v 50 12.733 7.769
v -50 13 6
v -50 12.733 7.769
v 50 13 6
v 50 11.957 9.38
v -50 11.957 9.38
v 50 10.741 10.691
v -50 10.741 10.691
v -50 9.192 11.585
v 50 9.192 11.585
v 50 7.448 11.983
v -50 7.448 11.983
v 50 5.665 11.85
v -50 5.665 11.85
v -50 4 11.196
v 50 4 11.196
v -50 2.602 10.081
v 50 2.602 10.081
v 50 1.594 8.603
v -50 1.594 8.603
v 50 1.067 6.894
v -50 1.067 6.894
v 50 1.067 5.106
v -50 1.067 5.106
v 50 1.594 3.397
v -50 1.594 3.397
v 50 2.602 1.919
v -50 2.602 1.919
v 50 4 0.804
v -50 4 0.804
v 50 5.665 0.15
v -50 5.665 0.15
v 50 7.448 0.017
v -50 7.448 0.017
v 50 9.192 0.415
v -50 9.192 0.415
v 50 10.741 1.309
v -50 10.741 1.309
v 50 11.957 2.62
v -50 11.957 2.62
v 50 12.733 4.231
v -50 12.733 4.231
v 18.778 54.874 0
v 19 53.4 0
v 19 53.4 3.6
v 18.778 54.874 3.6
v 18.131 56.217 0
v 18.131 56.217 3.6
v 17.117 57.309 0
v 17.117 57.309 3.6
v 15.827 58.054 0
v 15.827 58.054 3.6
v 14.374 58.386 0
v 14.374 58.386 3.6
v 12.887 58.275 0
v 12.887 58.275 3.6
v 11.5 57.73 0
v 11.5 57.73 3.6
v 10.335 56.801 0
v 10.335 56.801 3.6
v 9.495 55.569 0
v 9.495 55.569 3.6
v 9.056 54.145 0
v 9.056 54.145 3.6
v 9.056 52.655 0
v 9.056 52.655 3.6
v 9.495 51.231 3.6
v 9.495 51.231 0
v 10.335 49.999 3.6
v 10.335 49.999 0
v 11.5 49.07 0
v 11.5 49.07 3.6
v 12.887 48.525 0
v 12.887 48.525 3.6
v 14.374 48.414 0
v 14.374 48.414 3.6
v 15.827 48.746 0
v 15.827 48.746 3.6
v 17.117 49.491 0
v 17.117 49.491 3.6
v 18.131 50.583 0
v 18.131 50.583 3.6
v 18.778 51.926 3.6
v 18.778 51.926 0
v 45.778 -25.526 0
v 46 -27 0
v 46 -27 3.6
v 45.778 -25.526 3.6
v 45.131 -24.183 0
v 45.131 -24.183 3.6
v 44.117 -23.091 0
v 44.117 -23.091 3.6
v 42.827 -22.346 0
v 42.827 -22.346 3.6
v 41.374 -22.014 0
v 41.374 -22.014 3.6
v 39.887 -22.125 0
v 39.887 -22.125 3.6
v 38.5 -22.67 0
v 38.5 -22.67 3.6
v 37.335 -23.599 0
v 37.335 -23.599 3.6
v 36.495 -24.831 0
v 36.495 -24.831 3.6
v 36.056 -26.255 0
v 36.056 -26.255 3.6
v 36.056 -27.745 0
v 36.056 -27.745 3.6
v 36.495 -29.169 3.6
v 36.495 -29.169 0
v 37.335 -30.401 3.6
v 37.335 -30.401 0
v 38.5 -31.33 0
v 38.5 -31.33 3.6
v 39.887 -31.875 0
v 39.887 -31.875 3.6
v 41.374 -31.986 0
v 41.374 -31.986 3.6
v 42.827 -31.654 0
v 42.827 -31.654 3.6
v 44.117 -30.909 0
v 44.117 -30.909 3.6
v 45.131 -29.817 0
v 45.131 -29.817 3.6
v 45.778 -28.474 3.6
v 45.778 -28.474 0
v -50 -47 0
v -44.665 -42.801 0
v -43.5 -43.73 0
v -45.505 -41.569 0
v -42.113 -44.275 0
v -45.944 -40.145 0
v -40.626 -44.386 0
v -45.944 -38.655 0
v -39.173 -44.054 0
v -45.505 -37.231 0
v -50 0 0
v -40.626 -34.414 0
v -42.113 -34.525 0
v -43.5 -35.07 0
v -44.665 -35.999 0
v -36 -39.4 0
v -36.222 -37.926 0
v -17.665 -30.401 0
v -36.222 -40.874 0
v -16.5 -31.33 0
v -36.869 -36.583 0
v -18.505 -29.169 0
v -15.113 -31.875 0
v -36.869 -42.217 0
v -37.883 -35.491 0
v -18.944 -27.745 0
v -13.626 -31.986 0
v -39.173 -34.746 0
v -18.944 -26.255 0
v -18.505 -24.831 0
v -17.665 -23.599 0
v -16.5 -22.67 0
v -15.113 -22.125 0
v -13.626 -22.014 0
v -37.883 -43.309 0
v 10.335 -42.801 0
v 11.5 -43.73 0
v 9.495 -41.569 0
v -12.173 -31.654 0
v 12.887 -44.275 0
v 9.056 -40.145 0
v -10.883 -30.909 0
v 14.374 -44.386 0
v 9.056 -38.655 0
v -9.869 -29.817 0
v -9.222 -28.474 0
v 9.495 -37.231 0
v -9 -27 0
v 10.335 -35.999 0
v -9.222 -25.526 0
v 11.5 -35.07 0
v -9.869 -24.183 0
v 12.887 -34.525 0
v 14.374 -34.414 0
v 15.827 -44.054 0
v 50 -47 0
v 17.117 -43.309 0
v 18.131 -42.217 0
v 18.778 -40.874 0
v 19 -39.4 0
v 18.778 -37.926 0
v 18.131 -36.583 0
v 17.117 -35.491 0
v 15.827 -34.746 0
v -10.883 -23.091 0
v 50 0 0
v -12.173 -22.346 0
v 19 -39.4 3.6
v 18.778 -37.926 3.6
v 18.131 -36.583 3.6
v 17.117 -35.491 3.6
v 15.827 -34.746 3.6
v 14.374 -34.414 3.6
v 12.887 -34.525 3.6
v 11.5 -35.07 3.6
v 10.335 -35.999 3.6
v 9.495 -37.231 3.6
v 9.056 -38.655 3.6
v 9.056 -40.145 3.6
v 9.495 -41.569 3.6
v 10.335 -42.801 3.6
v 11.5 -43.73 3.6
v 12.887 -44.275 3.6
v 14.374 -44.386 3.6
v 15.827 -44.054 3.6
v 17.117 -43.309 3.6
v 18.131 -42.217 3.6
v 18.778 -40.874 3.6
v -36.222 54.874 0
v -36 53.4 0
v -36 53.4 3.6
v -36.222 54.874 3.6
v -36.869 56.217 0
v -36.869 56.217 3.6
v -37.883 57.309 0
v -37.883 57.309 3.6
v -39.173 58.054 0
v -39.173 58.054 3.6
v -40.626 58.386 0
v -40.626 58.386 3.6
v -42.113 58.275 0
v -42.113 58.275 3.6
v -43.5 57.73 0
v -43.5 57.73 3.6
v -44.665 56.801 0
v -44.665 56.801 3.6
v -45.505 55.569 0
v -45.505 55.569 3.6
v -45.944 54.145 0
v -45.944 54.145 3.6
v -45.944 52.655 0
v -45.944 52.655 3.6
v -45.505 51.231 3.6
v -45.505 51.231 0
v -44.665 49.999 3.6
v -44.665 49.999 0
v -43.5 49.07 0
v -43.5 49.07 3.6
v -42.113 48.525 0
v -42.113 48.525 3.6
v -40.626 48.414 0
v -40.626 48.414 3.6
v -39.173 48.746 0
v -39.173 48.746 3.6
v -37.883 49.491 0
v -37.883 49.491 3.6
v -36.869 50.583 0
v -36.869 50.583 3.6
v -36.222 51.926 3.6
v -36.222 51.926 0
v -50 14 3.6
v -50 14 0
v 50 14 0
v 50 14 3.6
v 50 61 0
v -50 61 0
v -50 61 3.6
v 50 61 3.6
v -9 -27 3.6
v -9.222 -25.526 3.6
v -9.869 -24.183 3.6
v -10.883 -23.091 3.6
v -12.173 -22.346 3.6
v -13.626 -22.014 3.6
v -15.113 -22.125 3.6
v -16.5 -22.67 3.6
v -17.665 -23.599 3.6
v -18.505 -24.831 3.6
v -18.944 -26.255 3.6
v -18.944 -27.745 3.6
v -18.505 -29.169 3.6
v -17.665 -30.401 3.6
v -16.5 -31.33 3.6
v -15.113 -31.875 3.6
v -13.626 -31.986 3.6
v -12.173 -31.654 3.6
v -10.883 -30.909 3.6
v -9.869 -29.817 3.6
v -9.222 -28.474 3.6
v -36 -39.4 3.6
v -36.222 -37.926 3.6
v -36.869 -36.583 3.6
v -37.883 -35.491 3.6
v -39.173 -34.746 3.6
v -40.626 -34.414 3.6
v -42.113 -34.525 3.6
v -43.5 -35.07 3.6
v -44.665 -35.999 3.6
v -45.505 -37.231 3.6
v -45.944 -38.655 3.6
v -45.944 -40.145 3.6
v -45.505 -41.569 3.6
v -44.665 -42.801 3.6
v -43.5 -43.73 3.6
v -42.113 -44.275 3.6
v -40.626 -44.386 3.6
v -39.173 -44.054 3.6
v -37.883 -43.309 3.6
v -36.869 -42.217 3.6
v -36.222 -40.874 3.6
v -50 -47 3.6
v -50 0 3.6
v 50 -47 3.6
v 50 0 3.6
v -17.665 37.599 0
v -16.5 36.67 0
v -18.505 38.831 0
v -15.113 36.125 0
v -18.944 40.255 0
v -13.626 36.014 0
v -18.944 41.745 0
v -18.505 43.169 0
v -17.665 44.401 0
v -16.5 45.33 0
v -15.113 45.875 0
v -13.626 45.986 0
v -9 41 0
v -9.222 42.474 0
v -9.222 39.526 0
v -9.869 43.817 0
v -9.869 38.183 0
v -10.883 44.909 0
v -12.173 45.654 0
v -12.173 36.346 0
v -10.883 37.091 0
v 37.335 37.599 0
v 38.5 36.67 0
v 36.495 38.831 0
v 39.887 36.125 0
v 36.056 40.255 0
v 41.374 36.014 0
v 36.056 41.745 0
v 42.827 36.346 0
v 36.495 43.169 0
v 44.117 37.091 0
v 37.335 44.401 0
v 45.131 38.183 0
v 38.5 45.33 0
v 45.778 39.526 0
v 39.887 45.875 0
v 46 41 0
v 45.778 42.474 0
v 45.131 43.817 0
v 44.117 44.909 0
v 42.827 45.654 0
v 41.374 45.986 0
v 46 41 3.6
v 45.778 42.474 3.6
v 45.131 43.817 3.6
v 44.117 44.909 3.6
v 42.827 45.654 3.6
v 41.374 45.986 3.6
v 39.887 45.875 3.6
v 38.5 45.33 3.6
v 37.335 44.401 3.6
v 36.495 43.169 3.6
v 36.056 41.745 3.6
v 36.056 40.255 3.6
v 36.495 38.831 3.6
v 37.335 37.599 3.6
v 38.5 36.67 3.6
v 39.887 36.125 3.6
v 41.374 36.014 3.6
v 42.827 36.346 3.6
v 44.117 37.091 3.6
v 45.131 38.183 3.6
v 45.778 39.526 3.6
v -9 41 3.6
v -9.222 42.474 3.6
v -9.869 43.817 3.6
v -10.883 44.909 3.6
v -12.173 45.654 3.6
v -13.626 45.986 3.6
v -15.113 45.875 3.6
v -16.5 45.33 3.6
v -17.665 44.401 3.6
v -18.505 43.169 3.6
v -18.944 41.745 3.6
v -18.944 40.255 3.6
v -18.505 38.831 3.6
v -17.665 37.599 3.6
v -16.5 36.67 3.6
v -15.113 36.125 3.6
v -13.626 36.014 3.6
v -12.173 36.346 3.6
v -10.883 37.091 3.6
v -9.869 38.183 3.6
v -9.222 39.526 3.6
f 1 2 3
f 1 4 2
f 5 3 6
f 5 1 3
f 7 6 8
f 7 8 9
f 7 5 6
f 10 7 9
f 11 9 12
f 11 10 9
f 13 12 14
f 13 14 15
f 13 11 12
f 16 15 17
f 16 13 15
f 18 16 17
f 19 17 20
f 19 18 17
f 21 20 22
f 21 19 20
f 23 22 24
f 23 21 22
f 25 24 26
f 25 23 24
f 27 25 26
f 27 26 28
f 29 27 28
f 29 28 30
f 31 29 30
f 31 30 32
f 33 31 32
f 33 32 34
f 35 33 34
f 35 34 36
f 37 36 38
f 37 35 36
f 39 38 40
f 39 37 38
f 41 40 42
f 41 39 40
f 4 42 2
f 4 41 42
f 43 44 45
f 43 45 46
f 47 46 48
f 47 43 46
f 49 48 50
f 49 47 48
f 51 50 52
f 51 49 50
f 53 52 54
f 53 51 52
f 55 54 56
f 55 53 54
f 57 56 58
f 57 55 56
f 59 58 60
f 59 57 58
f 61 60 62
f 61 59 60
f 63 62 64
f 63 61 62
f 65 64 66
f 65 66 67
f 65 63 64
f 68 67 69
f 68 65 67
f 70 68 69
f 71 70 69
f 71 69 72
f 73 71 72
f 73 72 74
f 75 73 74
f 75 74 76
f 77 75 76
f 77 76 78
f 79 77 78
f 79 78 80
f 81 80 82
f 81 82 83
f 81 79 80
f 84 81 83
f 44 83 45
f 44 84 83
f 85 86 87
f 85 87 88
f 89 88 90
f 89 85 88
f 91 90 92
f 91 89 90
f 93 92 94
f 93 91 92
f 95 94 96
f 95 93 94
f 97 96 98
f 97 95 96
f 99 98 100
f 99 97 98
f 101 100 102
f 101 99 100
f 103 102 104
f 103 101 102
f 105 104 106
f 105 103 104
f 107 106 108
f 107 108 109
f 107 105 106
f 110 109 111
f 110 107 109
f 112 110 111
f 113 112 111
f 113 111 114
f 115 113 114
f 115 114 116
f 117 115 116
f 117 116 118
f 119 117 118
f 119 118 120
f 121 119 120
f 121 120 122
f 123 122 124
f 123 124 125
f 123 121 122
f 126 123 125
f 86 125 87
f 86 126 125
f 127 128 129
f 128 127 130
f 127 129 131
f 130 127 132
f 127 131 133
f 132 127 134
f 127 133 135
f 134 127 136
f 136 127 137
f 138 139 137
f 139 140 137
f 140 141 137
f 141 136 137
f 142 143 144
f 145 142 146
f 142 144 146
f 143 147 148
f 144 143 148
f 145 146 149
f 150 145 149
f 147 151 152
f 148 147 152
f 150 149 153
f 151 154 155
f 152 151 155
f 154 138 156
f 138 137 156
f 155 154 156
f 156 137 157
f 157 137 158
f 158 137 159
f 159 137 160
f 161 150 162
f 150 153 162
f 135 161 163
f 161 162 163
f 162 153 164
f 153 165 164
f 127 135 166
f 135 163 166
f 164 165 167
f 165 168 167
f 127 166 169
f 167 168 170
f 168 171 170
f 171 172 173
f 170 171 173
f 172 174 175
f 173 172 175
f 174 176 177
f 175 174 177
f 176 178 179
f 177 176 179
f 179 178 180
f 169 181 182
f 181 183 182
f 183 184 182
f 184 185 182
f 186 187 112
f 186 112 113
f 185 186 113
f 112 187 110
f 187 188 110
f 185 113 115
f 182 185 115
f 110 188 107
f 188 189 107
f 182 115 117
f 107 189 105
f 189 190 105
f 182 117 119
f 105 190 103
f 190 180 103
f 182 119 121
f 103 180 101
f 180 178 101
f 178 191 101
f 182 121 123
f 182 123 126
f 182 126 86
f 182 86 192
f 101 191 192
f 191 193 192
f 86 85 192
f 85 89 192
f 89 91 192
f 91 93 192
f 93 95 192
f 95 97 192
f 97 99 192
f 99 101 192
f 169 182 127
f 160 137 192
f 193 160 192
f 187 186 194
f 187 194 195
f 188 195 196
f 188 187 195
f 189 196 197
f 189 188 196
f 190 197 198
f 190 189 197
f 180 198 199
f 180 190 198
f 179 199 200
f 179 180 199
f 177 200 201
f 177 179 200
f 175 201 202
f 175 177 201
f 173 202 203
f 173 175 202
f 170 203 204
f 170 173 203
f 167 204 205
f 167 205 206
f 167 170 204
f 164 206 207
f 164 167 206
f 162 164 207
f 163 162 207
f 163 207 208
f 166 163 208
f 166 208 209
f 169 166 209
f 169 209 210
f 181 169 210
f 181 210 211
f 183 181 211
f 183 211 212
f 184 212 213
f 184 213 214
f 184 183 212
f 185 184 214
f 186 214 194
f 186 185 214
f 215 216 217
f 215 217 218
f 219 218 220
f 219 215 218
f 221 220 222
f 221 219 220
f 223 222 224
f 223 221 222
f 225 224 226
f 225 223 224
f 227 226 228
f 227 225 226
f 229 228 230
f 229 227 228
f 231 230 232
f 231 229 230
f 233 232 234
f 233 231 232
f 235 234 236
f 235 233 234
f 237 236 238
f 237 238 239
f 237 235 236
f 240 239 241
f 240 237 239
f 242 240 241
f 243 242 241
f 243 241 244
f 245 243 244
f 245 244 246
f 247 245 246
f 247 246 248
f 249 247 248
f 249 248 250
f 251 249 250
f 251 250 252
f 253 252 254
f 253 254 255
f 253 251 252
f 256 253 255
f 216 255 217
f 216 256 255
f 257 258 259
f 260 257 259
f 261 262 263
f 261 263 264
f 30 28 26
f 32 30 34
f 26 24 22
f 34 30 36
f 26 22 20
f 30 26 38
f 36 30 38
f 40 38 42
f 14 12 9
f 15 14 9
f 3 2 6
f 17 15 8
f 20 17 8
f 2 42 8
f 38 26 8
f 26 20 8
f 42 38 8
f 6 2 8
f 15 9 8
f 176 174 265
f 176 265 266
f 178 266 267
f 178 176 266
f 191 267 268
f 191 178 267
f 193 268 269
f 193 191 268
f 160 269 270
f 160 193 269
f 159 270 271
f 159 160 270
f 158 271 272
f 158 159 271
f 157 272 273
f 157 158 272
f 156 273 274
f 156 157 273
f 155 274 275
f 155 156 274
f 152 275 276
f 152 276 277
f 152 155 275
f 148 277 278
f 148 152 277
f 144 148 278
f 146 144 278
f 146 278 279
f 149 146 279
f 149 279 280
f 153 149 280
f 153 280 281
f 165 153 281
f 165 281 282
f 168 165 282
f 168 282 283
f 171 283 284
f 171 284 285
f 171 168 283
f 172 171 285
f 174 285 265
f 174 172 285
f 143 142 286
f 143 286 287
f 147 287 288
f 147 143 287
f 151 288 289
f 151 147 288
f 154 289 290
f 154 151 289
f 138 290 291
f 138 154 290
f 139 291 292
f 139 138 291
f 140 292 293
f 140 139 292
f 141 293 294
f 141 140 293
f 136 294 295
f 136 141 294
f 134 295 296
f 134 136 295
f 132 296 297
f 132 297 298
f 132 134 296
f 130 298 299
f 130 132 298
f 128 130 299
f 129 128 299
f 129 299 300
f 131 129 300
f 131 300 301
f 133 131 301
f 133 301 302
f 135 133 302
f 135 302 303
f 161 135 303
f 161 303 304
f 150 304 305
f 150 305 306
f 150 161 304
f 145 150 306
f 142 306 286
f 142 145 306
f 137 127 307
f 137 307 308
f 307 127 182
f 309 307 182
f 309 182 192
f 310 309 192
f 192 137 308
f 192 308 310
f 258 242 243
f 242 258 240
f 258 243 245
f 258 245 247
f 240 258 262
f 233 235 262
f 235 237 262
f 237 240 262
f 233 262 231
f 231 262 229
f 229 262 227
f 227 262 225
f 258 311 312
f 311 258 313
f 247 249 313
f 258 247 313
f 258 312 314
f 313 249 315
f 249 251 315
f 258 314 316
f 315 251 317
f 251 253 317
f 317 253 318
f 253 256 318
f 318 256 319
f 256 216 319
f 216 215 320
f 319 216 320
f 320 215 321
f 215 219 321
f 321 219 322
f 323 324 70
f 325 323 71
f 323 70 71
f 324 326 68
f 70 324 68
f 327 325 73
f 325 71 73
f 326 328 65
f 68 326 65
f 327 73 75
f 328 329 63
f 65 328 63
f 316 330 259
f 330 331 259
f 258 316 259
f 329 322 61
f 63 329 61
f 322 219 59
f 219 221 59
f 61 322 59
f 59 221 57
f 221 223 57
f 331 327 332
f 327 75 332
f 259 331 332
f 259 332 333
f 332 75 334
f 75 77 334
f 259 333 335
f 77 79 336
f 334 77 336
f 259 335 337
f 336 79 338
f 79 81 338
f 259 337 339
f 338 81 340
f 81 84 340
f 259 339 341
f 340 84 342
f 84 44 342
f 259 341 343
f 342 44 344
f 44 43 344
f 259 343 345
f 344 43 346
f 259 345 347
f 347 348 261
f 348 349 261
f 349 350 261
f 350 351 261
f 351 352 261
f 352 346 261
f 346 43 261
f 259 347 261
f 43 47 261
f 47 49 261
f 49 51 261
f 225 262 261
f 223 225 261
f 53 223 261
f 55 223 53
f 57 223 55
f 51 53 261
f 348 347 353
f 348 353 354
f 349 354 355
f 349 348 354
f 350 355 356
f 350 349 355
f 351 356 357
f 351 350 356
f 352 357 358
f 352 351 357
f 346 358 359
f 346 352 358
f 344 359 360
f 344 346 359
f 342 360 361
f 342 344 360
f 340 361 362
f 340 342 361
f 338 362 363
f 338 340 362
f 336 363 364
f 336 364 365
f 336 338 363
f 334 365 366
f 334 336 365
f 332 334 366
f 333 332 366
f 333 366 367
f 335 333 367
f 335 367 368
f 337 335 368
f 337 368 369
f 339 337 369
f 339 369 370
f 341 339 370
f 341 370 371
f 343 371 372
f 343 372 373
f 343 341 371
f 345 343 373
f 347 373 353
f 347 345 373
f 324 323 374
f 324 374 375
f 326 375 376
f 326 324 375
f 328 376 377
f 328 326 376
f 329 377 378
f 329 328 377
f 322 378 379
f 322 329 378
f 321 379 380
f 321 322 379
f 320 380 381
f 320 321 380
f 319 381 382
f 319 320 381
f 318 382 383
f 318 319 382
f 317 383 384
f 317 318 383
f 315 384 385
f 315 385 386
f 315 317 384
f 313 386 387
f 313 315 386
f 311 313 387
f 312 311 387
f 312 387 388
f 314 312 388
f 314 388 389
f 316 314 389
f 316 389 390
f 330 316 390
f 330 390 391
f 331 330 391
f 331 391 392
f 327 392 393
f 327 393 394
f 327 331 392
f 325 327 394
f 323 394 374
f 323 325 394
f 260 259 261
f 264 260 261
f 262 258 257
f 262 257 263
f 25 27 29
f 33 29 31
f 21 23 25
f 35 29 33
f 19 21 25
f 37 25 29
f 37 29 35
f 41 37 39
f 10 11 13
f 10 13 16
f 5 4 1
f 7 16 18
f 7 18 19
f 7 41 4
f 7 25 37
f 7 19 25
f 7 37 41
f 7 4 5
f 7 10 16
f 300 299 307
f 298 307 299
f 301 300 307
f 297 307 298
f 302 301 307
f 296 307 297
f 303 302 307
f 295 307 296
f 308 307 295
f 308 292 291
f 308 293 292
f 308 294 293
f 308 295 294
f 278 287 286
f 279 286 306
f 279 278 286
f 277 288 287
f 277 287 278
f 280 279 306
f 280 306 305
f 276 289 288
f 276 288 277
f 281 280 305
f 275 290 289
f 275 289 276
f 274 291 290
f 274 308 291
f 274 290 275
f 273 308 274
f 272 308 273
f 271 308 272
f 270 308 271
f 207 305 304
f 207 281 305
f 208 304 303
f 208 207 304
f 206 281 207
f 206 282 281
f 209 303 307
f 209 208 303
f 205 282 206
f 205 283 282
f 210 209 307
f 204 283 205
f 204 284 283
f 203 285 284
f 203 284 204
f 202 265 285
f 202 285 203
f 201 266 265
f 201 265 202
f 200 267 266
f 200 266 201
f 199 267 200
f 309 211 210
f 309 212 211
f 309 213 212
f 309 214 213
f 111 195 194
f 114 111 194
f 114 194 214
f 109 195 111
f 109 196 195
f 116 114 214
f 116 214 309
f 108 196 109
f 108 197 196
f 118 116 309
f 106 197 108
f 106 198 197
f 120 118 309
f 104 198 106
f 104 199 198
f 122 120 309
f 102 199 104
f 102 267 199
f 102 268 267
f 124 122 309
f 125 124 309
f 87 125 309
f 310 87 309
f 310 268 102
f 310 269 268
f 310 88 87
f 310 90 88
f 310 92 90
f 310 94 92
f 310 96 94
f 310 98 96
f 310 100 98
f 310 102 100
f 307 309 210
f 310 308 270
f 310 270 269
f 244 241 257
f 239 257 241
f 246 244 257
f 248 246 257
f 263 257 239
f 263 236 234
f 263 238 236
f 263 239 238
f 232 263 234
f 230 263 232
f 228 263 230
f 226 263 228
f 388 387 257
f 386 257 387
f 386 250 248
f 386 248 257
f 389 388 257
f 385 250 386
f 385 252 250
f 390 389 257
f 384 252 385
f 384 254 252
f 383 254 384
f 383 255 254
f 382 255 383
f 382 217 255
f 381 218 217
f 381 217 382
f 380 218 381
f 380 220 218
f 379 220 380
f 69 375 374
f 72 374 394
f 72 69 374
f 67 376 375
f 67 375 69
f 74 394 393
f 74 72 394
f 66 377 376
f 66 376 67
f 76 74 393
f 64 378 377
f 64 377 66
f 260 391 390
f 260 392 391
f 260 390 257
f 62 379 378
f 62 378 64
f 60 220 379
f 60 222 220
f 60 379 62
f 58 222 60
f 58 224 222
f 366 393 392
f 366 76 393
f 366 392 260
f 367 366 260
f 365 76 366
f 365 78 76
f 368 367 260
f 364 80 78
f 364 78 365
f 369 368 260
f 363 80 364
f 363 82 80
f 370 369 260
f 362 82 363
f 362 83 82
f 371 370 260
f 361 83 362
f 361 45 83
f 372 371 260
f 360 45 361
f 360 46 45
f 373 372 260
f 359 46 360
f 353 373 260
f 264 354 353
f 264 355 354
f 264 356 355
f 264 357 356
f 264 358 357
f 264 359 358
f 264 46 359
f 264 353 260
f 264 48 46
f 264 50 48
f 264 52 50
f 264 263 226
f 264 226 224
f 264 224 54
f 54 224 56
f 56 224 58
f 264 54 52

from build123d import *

# Parameters (mm, degrees)
F0_W          = 100
F0_H          = 47
F0_R          = 5
F1_DEPTH      = 3.6
F2_R          = 6
F3_DEPTH      = 50
F3_DEPTH_BACK = 50


with BuildPart() as f1:
    # F0 (on Top) → F1 (new body)
    with BuildSketch(Plane.XY):
        with Locations((0, -23.5)):
            Rectangle(F0_W, F0_H)
        with Locations((-41, -39.4)):
            Circle(F0_R, mode=Mode.SUBTRACT)
        with Locations((-14, -27)):
            Circle(F0_R, mode=Mode.SUBTRACT)
        with Locations((14, -39.4)):
            Circle(F0_R, mode=Mode.SUBTRACT)
        with Locations((41, -27)):
            Circle(F0_R, mode=Mode.SUBTRACT)
        with Locations((0, 37.5)):
            Rectangle(F0_W, F0_H)
        with Locations((-41, 53.4)):
            Circle(F0_R, mode=Mode.SUBTRACT)
        with Locations((-14, 41)):
            Circle(F0_R, mode=Mode.SUBTRACT)
        with Locations((14, 53.4)):
            Circle(F0_R, mode=Mode.SUBTRACT)
        with Locations((41, 41)):
            Circle(F0_R, mode=Mode.SUBTRACT)
    extrude(amount=F1_DEPTH)


with BuildPart() as f3:
    # F2 (on Right) → F3 (new body, two sides)
    with BuildSketch(Plane.YZ) as f3_sk:
        with Locations((7, 6)):
            Circle(F2_R)
    extrude(amount=F3_DEPTH)
    extrude(f3_sk.sketch, amount=-F3_DEPTH_BACK)


solid = Compound([f1.part, f3.part])
